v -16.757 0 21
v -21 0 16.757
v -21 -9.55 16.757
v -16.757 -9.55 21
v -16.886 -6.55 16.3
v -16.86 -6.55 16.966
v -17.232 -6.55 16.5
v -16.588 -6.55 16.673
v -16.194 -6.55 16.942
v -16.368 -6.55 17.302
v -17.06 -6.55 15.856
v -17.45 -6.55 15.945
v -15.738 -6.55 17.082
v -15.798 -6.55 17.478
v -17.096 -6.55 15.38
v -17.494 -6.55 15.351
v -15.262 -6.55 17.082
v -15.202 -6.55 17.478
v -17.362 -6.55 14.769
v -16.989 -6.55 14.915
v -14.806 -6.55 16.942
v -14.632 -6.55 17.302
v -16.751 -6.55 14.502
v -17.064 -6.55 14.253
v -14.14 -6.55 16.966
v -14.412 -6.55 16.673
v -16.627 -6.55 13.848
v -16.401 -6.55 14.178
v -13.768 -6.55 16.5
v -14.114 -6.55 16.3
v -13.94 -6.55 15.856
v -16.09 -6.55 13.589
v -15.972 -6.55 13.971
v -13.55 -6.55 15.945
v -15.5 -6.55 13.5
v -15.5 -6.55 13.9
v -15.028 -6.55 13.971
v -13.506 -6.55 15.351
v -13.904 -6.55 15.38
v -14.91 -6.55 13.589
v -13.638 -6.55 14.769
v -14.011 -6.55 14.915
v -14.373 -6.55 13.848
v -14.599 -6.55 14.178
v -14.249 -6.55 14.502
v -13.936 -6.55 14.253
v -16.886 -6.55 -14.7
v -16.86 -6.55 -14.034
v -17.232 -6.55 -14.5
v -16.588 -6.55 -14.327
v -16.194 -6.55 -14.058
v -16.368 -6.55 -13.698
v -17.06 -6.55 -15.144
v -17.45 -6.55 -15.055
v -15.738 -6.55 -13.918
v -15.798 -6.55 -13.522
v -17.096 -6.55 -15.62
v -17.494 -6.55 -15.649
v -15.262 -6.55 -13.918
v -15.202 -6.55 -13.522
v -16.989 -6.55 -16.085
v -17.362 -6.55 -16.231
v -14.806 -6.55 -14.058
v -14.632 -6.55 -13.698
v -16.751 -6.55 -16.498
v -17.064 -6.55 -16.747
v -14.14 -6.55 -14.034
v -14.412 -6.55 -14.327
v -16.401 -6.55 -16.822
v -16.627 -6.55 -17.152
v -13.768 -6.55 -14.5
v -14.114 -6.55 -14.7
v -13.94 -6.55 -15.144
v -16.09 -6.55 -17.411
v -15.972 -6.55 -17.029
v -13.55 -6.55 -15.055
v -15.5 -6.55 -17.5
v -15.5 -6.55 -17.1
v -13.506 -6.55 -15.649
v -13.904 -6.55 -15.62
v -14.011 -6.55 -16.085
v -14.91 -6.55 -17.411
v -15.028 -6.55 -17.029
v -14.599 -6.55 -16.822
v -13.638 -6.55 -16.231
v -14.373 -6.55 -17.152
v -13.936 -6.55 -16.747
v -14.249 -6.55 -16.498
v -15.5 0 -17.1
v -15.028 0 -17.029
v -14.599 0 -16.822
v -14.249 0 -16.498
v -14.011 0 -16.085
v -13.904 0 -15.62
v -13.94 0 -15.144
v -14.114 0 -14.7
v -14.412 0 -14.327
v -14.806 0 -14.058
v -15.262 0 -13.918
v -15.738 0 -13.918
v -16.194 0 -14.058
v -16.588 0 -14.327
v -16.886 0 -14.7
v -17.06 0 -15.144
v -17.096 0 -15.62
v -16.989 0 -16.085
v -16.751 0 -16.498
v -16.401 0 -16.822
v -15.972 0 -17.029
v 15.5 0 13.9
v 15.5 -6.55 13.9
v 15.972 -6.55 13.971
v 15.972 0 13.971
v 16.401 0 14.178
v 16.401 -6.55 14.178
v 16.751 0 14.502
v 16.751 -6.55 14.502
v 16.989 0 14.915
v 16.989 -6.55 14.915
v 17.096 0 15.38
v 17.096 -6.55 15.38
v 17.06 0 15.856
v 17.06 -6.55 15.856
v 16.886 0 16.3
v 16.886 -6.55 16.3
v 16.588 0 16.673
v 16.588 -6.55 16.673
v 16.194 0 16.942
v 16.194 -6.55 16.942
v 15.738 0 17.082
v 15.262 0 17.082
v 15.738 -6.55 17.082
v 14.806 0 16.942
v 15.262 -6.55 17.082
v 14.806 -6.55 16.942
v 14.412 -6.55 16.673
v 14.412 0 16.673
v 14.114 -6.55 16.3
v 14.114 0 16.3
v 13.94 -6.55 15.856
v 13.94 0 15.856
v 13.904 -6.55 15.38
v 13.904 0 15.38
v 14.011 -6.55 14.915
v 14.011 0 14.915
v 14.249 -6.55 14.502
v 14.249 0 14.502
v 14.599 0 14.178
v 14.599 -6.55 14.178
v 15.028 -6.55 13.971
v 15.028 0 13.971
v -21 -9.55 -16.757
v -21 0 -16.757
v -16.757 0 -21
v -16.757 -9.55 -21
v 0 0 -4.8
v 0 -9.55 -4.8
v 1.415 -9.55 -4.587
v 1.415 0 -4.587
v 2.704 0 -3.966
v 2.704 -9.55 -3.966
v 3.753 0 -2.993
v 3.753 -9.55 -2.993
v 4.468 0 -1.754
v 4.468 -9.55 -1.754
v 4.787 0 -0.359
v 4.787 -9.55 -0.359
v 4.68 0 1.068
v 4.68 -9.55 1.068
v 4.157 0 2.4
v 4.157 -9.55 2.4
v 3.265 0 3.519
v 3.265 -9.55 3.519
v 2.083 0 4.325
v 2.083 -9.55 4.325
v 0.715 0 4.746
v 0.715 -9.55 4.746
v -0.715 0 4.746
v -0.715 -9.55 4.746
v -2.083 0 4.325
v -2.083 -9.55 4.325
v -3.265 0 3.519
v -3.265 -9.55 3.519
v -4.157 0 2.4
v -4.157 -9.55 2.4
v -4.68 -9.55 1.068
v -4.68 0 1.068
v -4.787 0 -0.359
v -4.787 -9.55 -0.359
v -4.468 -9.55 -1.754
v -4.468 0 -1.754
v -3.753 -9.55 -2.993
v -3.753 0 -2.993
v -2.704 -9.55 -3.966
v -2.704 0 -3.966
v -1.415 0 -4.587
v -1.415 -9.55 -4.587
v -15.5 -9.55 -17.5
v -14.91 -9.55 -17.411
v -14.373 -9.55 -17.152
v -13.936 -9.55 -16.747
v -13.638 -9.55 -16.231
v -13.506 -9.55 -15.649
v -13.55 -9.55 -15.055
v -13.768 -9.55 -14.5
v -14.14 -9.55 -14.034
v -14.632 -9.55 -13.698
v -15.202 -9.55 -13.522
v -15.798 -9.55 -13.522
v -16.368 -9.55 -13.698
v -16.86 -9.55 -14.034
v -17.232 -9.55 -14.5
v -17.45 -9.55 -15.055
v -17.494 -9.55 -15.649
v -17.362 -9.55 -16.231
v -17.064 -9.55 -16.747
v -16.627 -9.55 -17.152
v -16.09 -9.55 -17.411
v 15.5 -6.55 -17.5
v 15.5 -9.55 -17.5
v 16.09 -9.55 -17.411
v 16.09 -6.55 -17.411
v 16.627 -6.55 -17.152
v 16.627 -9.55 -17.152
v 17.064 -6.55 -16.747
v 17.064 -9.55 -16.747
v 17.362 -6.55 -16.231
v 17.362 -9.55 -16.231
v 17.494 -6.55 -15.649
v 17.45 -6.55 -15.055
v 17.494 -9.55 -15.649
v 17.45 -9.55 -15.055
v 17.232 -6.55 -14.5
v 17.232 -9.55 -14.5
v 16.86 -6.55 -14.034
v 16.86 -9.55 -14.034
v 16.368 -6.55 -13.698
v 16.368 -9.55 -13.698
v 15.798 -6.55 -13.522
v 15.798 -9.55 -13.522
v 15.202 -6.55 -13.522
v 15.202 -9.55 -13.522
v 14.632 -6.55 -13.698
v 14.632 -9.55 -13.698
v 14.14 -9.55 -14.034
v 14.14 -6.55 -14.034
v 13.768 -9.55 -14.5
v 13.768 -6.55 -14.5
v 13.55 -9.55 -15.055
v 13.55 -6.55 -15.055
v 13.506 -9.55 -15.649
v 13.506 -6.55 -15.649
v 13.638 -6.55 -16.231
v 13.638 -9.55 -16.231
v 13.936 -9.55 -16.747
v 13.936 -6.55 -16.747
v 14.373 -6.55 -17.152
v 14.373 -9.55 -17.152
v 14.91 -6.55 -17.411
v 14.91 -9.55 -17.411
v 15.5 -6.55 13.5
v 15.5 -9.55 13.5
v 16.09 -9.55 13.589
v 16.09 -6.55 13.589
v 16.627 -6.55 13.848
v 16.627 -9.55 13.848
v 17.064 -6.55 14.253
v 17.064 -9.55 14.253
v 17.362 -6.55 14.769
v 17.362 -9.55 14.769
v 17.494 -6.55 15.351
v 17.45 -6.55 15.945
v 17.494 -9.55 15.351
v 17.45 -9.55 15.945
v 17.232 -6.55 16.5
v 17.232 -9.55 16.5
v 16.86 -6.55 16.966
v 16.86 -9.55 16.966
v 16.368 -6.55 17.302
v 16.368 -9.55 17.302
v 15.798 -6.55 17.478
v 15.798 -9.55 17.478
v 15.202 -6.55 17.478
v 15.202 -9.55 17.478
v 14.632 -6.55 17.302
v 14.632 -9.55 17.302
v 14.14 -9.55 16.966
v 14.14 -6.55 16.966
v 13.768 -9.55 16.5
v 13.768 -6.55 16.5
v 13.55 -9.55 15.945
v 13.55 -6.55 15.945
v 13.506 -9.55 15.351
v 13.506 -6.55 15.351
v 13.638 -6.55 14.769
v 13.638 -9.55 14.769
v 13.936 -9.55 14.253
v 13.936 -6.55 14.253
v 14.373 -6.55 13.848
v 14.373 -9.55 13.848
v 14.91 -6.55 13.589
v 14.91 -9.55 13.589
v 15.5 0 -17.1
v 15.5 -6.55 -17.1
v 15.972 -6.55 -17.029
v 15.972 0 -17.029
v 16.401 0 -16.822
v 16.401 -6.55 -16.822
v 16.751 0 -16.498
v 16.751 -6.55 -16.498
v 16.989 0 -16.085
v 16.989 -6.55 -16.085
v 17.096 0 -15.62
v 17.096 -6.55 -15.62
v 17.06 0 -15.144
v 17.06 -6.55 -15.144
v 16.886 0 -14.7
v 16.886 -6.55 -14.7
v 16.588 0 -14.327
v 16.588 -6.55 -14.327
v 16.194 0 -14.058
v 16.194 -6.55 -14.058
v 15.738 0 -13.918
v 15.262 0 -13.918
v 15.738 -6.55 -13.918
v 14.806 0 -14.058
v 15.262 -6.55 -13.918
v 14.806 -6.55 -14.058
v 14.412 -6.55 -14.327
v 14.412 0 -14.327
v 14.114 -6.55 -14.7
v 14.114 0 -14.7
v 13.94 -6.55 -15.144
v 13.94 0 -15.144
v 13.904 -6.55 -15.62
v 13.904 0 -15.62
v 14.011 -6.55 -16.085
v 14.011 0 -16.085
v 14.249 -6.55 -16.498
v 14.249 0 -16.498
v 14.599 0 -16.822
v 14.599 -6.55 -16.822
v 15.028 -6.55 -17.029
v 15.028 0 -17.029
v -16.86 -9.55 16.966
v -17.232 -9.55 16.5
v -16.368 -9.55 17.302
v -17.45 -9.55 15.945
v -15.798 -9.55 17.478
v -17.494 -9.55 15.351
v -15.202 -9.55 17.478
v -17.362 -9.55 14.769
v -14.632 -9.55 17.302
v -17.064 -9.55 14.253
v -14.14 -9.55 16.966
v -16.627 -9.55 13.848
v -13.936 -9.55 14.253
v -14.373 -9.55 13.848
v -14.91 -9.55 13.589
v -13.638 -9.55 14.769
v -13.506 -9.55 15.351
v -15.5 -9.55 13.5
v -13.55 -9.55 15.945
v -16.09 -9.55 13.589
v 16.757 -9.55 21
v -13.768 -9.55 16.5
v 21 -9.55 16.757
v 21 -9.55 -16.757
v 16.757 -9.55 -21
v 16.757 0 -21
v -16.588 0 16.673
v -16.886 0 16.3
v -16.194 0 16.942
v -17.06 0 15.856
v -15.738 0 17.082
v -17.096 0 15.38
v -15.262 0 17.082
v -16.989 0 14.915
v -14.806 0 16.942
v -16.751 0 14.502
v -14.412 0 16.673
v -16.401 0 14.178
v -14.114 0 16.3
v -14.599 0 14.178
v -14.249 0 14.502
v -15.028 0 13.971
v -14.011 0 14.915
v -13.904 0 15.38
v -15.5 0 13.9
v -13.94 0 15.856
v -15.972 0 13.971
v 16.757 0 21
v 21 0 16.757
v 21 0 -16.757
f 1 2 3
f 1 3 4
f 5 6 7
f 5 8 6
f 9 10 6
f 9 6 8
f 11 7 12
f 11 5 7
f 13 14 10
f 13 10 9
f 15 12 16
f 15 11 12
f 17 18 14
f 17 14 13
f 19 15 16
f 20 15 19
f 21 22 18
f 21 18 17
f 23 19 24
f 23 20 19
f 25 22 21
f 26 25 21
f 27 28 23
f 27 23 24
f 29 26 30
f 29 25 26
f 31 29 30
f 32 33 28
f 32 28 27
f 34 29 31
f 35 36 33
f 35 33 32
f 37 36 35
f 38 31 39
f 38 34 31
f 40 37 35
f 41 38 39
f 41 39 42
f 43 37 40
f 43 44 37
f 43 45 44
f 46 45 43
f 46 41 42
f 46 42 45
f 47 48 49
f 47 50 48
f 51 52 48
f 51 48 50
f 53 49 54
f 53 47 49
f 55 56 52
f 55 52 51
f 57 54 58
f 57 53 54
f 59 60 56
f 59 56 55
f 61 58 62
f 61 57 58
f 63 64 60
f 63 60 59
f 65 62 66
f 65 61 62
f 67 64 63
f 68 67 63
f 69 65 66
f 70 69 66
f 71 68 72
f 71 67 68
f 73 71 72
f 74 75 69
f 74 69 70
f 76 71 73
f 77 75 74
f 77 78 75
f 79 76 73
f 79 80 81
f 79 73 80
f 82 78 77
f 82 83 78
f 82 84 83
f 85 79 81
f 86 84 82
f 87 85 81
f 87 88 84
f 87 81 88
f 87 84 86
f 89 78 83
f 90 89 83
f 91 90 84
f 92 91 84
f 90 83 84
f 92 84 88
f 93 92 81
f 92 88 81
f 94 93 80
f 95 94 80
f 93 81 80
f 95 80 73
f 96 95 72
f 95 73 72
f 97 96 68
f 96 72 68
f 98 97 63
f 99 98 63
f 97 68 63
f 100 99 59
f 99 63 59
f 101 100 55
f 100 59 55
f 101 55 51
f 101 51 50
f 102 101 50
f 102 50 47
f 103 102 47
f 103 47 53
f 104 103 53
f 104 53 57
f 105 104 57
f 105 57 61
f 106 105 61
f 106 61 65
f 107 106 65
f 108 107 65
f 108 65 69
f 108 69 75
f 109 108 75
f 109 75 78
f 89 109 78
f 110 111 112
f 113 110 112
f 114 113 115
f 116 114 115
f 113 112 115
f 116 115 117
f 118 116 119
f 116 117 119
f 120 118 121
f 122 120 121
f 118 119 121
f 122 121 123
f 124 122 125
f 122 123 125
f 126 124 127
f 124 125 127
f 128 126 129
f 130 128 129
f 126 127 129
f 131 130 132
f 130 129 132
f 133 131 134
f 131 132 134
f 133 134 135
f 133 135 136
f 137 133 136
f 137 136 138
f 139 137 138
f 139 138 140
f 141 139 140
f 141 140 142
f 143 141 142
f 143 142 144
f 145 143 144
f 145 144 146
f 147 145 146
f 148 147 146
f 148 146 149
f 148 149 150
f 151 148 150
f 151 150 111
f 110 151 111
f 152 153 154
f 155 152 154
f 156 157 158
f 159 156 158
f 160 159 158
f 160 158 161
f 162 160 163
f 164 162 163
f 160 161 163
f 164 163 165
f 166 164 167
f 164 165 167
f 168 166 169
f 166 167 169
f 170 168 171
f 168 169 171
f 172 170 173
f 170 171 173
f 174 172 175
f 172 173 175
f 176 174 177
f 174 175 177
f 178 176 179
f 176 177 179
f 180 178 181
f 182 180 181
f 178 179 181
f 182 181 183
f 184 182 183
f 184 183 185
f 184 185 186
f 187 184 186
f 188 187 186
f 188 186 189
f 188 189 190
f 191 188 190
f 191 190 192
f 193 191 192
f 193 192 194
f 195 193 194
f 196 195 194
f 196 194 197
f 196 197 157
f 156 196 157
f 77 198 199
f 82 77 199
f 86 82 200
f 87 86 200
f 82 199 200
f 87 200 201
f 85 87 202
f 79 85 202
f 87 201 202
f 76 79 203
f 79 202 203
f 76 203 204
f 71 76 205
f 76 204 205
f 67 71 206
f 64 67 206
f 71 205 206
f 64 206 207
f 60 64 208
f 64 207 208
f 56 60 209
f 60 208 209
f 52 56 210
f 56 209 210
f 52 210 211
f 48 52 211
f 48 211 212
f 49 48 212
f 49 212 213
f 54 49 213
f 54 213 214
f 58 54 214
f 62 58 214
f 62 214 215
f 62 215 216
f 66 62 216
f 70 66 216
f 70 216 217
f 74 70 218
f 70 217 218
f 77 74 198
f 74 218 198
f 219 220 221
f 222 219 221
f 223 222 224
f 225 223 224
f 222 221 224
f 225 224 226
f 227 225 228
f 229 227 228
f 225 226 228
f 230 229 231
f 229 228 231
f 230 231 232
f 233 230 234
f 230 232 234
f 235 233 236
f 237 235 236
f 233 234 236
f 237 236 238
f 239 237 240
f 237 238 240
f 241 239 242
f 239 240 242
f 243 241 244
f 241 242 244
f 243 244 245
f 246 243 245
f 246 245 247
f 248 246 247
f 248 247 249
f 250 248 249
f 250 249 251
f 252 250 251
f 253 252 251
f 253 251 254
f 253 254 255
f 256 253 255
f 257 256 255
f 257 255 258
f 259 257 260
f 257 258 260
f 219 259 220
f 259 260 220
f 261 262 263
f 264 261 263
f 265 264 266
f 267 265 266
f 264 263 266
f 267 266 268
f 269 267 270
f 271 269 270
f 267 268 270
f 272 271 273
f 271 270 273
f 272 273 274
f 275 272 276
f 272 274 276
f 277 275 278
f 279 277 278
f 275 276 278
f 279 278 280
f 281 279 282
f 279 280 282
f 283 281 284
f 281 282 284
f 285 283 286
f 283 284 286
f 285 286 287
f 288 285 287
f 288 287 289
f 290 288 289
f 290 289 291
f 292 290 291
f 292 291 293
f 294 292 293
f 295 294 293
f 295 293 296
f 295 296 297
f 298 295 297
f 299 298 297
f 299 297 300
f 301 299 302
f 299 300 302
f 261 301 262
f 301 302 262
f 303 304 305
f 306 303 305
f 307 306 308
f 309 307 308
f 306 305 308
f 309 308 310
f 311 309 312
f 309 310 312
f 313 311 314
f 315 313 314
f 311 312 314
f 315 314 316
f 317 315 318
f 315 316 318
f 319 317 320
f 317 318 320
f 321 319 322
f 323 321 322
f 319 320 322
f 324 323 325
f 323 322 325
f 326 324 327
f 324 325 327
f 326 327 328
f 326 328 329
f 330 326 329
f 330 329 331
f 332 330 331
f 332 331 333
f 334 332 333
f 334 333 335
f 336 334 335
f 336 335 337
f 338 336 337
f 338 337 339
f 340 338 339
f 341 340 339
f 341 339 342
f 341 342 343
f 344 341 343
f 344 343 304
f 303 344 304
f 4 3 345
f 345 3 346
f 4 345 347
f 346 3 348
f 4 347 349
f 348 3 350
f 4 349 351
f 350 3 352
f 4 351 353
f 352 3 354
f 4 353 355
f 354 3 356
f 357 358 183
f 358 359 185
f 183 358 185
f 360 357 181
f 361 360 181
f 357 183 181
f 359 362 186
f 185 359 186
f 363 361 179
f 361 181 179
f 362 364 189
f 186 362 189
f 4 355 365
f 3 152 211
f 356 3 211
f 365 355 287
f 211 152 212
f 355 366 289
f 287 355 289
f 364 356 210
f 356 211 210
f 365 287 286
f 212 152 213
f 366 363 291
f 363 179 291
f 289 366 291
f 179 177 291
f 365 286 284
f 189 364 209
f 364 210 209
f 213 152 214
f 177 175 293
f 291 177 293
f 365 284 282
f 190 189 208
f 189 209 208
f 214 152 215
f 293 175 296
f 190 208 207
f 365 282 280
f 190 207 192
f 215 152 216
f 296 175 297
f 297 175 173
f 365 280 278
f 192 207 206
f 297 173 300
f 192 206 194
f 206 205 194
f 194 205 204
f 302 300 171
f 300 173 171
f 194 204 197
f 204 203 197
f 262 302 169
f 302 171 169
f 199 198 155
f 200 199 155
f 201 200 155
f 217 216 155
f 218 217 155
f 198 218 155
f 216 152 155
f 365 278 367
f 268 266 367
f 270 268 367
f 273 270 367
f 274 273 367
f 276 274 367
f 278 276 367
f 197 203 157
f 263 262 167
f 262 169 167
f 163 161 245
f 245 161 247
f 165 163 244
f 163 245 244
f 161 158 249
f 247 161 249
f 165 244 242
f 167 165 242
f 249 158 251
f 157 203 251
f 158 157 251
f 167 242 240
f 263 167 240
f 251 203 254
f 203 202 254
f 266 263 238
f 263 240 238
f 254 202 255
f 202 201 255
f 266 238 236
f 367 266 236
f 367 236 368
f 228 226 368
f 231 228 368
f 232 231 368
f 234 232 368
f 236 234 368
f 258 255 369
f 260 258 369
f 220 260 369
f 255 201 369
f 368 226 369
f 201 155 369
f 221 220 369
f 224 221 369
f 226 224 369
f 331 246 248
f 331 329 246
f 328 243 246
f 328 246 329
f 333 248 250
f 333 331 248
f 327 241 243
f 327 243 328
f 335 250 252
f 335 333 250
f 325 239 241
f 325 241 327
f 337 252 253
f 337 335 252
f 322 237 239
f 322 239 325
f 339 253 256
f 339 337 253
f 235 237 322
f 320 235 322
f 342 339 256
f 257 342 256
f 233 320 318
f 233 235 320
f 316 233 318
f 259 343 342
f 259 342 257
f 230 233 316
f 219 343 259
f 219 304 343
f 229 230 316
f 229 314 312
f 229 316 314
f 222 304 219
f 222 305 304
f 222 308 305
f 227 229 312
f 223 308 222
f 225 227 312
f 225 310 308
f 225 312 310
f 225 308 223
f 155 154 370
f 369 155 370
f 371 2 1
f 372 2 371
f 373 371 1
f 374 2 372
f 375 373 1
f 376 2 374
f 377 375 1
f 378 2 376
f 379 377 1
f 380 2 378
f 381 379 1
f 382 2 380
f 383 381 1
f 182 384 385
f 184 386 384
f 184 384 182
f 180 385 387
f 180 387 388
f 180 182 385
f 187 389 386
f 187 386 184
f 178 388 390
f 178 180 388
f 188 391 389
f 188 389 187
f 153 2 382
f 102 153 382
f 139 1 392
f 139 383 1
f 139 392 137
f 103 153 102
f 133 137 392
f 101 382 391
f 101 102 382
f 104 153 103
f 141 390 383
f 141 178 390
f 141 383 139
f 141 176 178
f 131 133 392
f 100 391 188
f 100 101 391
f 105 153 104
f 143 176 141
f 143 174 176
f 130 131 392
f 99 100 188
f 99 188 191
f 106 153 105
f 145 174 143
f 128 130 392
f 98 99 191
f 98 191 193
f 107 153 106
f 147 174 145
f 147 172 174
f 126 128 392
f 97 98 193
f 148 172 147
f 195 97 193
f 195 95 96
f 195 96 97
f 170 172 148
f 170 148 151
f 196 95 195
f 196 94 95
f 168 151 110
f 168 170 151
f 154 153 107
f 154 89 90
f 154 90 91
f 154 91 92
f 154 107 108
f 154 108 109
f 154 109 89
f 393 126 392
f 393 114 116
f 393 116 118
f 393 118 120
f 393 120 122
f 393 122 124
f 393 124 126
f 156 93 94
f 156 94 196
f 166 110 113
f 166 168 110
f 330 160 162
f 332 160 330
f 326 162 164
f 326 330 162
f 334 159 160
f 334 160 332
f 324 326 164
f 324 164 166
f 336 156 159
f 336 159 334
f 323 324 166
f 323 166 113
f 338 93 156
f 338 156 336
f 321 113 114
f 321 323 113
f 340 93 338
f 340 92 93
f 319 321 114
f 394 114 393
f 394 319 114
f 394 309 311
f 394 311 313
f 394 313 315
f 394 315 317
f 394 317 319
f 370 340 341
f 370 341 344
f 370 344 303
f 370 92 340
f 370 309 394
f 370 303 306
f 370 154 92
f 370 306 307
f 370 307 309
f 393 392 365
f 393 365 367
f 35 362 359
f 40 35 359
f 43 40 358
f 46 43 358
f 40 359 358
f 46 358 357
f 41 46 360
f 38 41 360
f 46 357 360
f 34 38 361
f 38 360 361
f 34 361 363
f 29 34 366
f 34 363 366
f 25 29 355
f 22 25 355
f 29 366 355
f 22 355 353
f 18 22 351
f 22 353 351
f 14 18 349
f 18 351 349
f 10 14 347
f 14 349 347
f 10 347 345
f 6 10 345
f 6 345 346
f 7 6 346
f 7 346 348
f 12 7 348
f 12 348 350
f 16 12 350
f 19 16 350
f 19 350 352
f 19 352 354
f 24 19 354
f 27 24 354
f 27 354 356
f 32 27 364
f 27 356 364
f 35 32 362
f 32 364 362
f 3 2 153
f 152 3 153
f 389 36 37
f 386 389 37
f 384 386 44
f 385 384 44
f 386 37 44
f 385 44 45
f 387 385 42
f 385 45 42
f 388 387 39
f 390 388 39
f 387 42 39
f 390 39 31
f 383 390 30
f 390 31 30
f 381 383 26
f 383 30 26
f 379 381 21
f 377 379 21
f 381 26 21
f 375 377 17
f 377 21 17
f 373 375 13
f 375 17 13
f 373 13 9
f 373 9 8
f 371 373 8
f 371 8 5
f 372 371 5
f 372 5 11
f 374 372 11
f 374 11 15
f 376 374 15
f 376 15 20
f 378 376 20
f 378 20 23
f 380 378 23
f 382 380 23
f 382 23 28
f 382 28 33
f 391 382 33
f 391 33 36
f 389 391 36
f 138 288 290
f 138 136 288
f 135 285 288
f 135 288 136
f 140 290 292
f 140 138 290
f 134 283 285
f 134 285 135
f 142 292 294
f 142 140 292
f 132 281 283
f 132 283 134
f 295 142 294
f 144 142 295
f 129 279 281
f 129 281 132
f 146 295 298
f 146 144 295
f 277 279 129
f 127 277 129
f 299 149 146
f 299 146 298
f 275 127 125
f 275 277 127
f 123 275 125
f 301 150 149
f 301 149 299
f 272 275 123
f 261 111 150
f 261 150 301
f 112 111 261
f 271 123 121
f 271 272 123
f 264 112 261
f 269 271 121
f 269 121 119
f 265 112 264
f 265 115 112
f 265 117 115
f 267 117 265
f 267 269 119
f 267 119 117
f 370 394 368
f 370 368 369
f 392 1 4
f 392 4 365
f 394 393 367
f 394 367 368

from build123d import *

# Parameters (mm, degrees)
ESBO_O1_W             = 42
ESBO_O1_H             = 42
FLANGE_BASE1_DEPTH    = 9.55
CORTE_EXTRUS_O2_DEPTH = 32.196193678
ESBO_O4_R             = 4.8
CORTE_EXTRUS_O4_DEPTH = 32.196193678
ESBO_O16_R            = 2
CORTE_EXTRUS_O6_DEPTH = 3
ESBO_O19_R            = 1.6
CORTE_EXTRUS_O7_DEPTH = 31.412209719


# Sheet-metal steps are written as plain solids
with BuildPart() as part:
    # Esboço1 → Flange-base1 (new body)
    with BuildSketch(Plane(origin=(0, 0, 0), x_dir=(1, 0, 0), z_dir=(0, 1, 0))):
        Rectangle(ESBO_O1_W, ESBO_O1_H)
    extrude(amount=-FLANGE_BASE1_DEPTH)

    # Esboço3 → Corte-extrusão2 (cut, through all)
    with BuildSketch(Plane.XZ.offset(9.55)):
        Polygon((-21, 16.757359313), (-16.757359313, 21), (-21, 21), align=None)
        Polygon((-21, -21), (-21, -16.757359313), (-16.757359313, -21), align=None)
        Polygon((21, -21), (21, -16.757359313), (16.757359313, -21), align=None)
        Polygon((21, 16.757359313), (21, 21), (16.757359313, 21), align=None)
    extrude(amount=-CORTE_EXTRUS_O2_DEPTH, mode=Mode.SUBTRACT)

    # Esboço4 → Corte-extrusão4 (cut, through all)
    with BuildSketch(Plane.XZ.offset(9.55)):
        with Locations(Location((0, 0, 0), (0, 0, 270))):
            Circle(ESBO_O4_R)
    extrude(amount=-CORTE_EXTRUS_O4_DEPTH, mode=Mode.SUBTRACT)

    # Esboço16 → Corte-extrusão6 (cut)
    with BuildSketch(Plane.XZ.offset(9.55)):
        with Locations(Location((-15.5, -15.5, 0), (0, 0, 270))):
            Circle(ESBO_O16_R)
        with Locations(Location((-15.5, 15.5, 0), (0, 0, 270))):
            Circle(ESBO_O16_R)
        with Locations(Location((15.5, 15.5, 0), (0, 0, 270))):
            Circle(ESBO_O16_R)
        with Locations(Location((15.5, -15.5, 0), (0, 0, 270))):
            Circle(ESBO_O16_R)
    extrude(amount=-CORTE_EXTRUS_O6_DEPTH, mode=Mode.SUBTRACT)

    # Esboço19 → Corte-extrusão7 (cut, through all)
    with BuildSketch(Plane.XZ.offset(6.55)):
        with Locations(Location((15.5, -15.5, 0), (0, 0, 270))):
            Circle(ESBO_O19_R)
        with Locations(Location((-15.5, -15.5, 0), (0, 0, 270))):
            Circle(ESBO_O19_R)
        with Locations(Location((15.5, 15.5, 0), (0, 0, 270))):
            Circle(ESBO_O19_R)
        with Locations(Location((-15.5, 15.5, 0), (0, 0, 270))):
            Circle(ESBO_O19_R)
    extrude(amount=-CORTE_EXTRUS_O7_DEPTH, mode=Mode.SUBTRACT)


solid = part.part
